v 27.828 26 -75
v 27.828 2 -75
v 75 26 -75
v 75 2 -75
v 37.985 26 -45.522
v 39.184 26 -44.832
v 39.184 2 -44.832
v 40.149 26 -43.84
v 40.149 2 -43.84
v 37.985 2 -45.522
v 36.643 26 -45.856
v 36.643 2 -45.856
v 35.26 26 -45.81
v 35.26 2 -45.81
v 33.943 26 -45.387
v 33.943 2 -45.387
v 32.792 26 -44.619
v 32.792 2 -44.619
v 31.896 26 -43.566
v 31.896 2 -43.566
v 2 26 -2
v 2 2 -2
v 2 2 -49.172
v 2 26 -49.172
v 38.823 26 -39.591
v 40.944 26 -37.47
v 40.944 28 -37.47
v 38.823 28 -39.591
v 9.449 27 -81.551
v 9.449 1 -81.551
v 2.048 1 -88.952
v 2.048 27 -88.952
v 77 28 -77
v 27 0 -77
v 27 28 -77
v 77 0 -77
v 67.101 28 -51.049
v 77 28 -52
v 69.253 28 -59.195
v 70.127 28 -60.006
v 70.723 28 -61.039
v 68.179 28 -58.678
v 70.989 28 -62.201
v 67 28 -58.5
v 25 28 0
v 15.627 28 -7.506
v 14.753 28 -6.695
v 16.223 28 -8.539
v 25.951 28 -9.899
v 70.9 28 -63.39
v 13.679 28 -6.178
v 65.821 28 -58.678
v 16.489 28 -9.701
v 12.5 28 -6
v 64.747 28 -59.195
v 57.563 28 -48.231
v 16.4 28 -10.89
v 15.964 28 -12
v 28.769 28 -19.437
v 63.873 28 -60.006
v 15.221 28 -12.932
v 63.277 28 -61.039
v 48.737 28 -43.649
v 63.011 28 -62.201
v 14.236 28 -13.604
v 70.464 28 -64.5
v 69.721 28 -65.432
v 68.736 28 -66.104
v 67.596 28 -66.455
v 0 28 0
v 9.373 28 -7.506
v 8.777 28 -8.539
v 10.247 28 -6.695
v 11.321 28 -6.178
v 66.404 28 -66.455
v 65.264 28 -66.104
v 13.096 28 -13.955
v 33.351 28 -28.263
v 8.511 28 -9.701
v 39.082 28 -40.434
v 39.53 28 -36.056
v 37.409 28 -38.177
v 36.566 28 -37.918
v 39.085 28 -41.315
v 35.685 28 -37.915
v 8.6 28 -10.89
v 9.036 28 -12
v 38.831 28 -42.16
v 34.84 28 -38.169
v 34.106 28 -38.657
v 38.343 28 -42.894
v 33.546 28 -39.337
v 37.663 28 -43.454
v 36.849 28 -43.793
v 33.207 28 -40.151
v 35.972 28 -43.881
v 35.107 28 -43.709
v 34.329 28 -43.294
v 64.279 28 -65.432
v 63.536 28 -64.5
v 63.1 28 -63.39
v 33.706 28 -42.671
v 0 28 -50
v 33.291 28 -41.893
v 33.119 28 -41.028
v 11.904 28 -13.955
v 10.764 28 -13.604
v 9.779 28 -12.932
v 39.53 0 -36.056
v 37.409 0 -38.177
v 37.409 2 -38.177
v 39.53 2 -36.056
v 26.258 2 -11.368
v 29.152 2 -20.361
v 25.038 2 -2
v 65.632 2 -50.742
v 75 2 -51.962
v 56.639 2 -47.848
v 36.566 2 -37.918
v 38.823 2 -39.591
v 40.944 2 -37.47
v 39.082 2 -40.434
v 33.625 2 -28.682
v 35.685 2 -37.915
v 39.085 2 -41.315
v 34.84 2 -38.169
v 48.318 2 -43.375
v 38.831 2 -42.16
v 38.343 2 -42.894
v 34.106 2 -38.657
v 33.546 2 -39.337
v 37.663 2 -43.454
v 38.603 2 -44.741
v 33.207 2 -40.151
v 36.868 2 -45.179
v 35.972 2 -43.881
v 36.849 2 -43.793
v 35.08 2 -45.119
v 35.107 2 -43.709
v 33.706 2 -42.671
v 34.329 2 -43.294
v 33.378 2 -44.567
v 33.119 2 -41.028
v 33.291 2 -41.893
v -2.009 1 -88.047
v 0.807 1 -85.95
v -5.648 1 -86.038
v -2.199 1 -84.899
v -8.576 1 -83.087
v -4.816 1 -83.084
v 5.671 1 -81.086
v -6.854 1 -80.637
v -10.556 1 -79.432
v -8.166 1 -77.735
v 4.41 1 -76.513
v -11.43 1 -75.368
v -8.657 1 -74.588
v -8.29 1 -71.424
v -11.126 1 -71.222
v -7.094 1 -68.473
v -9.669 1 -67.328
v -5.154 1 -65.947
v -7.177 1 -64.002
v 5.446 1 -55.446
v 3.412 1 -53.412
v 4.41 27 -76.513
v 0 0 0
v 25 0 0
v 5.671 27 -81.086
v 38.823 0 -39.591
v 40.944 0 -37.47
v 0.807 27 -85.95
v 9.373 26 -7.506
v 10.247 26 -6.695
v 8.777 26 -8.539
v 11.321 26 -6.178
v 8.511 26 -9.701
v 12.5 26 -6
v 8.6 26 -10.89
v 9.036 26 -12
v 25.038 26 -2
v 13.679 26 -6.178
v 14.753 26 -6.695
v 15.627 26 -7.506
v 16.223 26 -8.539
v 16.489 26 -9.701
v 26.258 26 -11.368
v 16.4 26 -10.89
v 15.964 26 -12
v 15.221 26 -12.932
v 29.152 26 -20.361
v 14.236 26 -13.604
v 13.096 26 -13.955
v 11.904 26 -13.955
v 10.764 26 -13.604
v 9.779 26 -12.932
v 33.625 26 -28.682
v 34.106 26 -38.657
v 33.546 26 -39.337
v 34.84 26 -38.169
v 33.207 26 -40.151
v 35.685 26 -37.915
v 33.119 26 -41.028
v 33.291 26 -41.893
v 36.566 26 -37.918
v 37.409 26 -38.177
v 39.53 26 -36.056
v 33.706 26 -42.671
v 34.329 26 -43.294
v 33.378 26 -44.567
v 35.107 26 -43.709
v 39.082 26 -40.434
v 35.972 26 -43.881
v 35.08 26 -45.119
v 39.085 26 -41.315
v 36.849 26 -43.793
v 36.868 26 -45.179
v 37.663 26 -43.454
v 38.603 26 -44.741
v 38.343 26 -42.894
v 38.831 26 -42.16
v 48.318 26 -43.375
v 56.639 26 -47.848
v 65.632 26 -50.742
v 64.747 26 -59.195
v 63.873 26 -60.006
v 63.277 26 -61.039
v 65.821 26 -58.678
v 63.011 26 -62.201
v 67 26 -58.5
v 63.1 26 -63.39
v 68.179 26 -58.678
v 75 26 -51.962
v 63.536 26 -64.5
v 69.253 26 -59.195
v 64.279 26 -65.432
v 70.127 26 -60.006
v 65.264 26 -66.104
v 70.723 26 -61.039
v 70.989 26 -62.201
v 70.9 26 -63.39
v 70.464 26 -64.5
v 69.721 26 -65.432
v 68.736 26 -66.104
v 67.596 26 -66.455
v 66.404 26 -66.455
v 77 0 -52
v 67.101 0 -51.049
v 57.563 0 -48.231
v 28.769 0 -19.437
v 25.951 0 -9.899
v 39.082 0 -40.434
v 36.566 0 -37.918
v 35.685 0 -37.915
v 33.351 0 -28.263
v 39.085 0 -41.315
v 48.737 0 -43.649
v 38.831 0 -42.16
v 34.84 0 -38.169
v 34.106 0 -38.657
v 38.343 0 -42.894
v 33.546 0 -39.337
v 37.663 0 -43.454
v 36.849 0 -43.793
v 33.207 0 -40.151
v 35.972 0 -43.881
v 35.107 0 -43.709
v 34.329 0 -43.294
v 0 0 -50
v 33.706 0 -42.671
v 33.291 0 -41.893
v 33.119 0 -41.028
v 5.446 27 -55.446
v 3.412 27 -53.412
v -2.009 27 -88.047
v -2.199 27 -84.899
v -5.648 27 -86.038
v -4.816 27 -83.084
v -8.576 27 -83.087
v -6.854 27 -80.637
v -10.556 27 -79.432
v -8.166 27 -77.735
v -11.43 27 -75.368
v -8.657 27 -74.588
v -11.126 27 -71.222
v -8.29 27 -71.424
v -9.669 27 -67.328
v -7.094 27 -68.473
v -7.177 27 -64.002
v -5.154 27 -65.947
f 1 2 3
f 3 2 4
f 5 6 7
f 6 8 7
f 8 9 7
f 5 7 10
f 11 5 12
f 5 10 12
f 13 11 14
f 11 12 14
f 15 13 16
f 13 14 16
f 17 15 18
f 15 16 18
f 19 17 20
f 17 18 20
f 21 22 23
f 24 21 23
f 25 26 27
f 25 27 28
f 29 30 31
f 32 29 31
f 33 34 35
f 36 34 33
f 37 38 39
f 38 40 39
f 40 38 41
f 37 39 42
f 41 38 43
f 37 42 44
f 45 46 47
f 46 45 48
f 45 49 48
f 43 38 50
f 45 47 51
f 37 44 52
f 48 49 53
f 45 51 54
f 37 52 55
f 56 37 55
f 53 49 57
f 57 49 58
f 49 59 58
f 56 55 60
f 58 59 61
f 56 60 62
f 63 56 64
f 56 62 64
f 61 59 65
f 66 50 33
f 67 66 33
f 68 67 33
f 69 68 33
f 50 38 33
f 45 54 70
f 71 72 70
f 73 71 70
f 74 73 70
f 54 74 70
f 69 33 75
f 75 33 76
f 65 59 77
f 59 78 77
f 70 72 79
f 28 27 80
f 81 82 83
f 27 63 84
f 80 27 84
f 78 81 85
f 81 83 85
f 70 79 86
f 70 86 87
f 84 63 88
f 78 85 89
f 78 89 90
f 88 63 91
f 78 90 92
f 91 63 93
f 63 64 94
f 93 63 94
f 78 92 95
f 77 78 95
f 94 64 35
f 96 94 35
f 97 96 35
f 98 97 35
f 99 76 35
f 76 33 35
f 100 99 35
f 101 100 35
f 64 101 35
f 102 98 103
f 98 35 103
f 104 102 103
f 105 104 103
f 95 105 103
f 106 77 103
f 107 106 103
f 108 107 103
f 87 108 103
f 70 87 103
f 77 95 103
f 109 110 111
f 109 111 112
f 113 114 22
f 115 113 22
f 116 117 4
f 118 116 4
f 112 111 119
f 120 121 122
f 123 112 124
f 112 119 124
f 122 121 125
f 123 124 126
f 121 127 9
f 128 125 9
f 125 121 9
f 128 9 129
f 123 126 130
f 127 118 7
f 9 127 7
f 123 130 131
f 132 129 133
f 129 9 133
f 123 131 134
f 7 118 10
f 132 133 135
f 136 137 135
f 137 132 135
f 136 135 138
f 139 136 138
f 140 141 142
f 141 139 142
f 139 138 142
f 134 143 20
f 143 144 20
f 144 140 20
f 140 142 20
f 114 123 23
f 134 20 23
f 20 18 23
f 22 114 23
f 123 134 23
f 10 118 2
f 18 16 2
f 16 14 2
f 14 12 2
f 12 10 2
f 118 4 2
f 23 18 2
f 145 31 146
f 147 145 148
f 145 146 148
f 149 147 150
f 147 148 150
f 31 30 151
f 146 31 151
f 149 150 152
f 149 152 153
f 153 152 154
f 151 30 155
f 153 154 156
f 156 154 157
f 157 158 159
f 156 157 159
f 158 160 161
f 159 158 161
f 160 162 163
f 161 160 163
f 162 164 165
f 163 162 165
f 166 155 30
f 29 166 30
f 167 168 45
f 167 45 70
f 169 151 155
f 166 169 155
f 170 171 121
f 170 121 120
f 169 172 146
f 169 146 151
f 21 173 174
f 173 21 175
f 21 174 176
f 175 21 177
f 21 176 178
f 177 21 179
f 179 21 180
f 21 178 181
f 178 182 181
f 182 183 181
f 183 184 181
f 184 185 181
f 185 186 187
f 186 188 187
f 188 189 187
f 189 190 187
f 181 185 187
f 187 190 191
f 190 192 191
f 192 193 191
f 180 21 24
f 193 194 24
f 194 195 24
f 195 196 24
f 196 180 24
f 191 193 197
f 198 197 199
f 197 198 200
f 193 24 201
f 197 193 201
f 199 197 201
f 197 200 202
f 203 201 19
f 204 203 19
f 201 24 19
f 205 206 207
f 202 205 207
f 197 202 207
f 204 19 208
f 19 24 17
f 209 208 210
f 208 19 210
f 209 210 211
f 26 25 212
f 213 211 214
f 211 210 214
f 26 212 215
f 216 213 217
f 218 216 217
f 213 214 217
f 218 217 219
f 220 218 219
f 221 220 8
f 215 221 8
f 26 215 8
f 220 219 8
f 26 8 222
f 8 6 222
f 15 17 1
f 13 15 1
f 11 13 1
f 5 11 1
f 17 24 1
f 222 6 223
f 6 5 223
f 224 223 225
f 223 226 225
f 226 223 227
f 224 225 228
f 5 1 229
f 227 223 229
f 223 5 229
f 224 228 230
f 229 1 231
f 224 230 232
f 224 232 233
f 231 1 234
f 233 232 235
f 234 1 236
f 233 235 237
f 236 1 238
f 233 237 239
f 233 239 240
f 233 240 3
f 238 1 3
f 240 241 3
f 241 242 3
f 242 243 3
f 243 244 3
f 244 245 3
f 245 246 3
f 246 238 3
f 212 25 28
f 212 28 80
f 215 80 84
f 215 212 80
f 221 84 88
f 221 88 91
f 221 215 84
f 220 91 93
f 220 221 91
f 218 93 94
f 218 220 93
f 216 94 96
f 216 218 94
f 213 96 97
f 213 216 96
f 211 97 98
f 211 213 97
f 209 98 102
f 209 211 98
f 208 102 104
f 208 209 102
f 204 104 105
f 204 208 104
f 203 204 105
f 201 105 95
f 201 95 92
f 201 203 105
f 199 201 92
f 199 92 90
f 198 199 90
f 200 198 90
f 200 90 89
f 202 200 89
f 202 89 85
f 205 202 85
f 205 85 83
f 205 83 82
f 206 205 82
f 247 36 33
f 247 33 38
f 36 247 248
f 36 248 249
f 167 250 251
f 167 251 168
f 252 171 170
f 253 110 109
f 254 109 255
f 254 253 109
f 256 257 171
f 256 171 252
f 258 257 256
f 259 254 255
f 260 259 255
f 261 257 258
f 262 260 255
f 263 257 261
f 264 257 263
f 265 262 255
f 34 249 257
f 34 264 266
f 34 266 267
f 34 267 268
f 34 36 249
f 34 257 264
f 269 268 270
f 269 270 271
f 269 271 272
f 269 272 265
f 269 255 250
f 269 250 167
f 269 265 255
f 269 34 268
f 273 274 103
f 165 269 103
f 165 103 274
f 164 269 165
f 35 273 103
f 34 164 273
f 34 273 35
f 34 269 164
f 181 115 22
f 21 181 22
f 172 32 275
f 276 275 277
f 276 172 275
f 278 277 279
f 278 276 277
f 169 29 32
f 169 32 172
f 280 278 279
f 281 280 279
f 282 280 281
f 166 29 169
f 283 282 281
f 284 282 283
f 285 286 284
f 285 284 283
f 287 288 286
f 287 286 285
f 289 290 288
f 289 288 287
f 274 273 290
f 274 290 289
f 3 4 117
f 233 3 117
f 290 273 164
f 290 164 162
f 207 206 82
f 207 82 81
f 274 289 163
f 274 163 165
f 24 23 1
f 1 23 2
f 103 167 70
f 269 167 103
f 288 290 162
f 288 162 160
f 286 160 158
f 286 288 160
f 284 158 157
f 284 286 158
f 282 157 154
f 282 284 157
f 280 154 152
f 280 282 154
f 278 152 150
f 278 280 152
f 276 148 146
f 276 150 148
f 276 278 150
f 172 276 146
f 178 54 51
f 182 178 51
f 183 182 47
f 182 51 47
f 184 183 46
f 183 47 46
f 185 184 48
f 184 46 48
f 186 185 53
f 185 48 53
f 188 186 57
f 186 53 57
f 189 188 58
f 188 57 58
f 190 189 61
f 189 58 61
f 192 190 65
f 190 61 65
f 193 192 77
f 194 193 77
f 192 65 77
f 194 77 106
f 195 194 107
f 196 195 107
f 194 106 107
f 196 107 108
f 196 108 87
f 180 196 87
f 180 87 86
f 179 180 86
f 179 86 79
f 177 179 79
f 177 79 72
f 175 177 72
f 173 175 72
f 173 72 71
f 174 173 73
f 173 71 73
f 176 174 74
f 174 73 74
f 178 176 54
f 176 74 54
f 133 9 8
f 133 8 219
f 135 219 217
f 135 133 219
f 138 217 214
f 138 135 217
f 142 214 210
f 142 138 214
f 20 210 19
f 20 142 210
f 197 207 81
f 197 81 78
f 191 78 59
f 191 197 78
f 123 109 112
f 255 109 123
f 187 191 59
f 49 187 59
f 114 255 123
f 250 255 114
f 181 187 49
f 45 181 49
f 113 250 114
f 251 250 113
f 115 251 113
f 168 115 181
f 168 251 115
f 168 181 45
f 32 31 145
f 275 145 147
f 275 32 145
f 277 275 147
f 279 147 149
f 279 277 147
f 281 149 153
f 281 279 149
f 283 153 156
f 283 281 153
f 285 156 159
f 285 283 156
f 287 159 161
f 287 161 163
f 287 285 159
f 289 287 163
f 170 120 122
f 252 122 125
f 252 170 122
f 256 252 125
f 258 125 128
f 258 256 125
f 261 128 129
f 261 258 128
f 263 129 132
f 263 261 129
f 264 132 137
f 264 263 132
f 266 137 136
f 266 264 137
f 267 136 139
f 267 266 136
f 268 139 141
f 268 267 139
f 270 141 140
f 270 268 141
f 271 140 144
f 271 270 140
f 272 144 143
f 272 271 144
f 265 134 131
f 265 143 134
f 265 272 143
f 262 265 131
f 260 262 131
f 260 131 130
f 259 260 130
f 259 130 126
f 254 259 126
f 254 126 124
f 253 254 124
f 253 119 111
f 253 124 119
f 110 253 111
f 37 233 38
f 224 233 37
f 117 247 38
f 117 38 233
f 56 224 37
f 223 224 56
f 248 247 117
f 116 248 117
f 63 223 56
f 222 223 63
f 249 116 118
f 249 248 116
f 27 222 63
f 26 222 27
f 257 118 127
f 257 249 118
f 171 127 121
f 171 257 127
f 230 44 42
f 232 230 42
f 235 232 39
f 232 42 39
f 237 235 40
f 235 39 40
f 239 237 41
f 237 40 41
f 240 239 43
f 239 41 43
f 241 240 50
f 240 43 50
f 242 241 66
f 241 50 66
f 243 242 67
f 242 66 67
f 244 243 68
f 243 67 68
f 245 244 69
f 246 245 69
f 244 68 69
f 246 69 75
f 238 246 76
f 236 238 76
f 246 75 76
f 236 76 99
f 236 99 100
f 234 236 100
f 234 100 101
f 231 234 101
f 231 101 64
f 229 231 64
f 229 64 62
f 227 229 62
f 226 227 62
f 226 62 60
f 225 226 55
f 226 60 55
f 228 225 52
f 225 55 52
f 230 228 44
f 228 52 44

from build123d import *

# Parameters (mm, degrees)
BOSS_EXTRUDE1_DEPTH     = 28
SHELL1_T                = -2
CUT_EXTRUDE1_DEPTH      = 12
CUT_EXTRUDE1_DEPTH_BACK = 12
SKETCH9_R               = 6.4
SKETCH12_R              = 4
CUT_EXTRUDE3_DEPTH      = 2
SKETCH17_W              = 36.183766184
SKETCH17_H              = 26
BOSS_EXTRUDE2_DEPTH     = 30
CUT_EXTRUDE14_DEPTH     = 30


with BuildPart() as part:
    # Sketch1 → Boss-Extrude1 (new body)
    with BuildSketch(Plane(origin=(0, 0, 0), x_dir=(1, 0, 0), z_dir=(0, 1, 0))):
        with BuildLine():
            Line((0, 0), (0, 50))
            Line((0, 50), (27, 77))
            Line((27, 77), (77, 77))
            Line((77, 77), (77, 52))
            ThreePointArc((77, 52), (57.56334266, 48.230865133), (40.944353892, 37.46985967))
            Line((40.944353892, 37.46985967), (38.823033548, 39.591180014))
            ThreePointArc((38.823033548, 39.591180014), (33.994606424, 43.005393576), (37.408819986, 38.176966452))
            Line((37.408819986, 38.176966452), (39.53014033, 36.055646108))
            ThreePointArc((39.53014033, 36.055646108), (28.769134867, 19.43665734), (25, 0))
            Line((25, 0), (0, 0))
        make_face()
    extrude(amount=BOSS_EXTRUDE1_DEPTH)

    # Shell1
    shell1_openings = [part.faces().sort_by_distance(p)[0] for p in [
        (57.56334266, 14, -48.230865133),
        (28.769134867, 14, -19.43665734),
    ]]
    offset(amount=SHELL1_T, openings=shell1_openings, kind=Kind.INTERSECTION)

    # Sketch9 → Cut-Extrude1 (cut, two sides: drawn at the far end of the back side and taken through both)
    with BuildSketch(Plane(origin=(0, 14, 0), x_dir=(1, 0, 0), z_dir=(0, 1, 0)).offset(-CUT_EXTRUDE1_DEPTH_BACK)):
        with Locations((36.184678266, 38.815321734)):
            Circle(SKETCH9_R)
    extrude(amount=CUT_EXTRUDE1_DEPTH + CUT_EXTRUDE1_DEPTH_BACK, mode=Mode.SUBTRACT)

    # Sketch12 → Cut-Extrude3 (cut)
    with BuildSketch(Plane(origin=(0, 28, 0), x_dir=(1, 0, 0), z_dir=(0, 1, 0))):
        with Locations((67, 62.5)):
            Circle(SKETCH12_R)
        with Locations((12.5, 10)):
            Circle(SKETCH12_R)
    extrude(amount=-CUT_EXTRUDE3_DEPTH, mode=Mode.SUBTRACT)

    # Sketch17 → Boss-Extrude2 (add)
    with BuildSketch(Plane(origin=(-25, 0, -25), x_dir=(-0.7071067811865435, 0, 0.7071067811865516), z_dir=(-0.7071067811865516, 0, -0.7071067811865435))):
        with Locations((-54.447222151, 14)):
            Rectangle(SKETCH17_W, SKETCH17_H)
    extrude(amount=BOSS_EXTRUDE2_DEPTH)

    # Sketch19<7> → Cut-Extrude14 (cut)
    with BuildSketch(Plane(origin=(0, 27, 0), x_dir=(1, 0, 0), z_dir=(0, 1, 0))):
        with BuildLine():
            Line((-7.176599947, 64.001557861), (3.412478957, 53.412478957))
            Line((3.412478957, 53.412478957), (0.707106781, 50.707106781))
            Line((0.707106781, 50.707106781), (-20.506096654, 71.920310217))
            Line((-20.506096654, 71.920310217), (5.079689783, 97.506096654))
            Line((5.079689783, 97.506096654), (26.292893219, 76.292893219))
            Line((26.292893219, 76.292893219), (5.445665953, 55.445665953))
            Line((5.445665953, 55.445665953), (-5.153515959, 65.947132971))
            ThreePointArc((-5.153515959, 65.947132971), (-8.165921561, 77.734505129), (0.807292373, 85.950231609))
            Line((0.807292373, 85.950231609), (5.671042553, 81.08648143))
            Line((5.671042553, 81.08648143), (4.410448732, 76.512705214))
            Line((4.410448732, 76.512705214), (9.448954094, 81.551210575))
            Line((9.448954094, 81.551210575), (2.047814256, 88.952350413))
            ThreePointArc((2.047814256, 88.952350413), (-10.556487738, 79.431665635), (-7.176599947, 64.001557861))
        make_face()
    extrude(amount=-CUT_EXTRUDE14_DEPTH, mode=Mode.SUBTRACT)


solid = part.part
